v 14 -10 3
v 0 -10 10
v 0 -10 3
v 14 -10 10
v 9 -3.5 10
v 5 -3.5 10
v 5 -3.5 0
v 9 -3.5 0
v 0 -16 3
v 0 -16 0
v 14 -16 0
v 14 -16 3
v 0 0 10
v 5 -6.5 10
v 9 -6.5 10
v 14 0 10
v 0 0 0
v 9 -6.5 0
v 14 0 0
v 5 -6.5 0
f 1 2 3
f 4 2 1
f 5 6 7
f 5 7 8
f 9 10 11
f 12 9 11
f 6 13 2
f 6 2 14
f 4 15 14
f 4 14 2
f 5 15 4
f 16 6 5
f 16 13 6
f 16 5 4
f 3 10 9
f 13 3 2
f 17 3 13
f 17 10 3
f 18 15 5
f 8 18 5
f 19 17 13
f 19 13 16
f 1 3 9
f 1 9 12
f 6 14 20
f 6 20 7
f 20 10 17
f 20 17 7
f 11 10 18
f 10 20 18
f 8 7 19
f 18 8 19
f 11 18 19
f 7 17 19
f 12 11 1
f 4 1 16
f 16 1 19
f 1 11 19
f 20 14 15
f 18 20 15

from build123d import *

# Parameters (mm, degrees)
F0_W     = 14
F0_H     = 16
F1_DEPTH = 10
F2_W     = 14
F2_H     = 6
F3_DEPTH = 7
F4_W     = 4
F4_H     = 3
F5_DEPTH = 10.001


with BuildPart() as f1:
    # F0 (on Top) → F1 (new body)
    with BuildSketch(Plane.XY):
        with Locations((7, -8)):
            Rectangle(F0_W, F0_H)
    extrude(amount=F1_DEPTH)

    # F2 (on face) → F3 (cut)
    with BuildSketch(Plane.XY.offset(10)):
        with Locations((7, -13)):
            Rectangle(F2_W, F2_H)
    extrude(amount=-F3_DEPTH, mode=Mode.SUBTRACT)

    # F4 (on face) → F5 (cut, through all)
    with BuildSketch(Plane.XY.offset(10)):
        with Locations((7, -5)):
            Rectangle(F4_W, F4_H)
    extrude(amount=-F5_DEPTH, mode=Mode.SUBTRACT)


solid = f1.part
